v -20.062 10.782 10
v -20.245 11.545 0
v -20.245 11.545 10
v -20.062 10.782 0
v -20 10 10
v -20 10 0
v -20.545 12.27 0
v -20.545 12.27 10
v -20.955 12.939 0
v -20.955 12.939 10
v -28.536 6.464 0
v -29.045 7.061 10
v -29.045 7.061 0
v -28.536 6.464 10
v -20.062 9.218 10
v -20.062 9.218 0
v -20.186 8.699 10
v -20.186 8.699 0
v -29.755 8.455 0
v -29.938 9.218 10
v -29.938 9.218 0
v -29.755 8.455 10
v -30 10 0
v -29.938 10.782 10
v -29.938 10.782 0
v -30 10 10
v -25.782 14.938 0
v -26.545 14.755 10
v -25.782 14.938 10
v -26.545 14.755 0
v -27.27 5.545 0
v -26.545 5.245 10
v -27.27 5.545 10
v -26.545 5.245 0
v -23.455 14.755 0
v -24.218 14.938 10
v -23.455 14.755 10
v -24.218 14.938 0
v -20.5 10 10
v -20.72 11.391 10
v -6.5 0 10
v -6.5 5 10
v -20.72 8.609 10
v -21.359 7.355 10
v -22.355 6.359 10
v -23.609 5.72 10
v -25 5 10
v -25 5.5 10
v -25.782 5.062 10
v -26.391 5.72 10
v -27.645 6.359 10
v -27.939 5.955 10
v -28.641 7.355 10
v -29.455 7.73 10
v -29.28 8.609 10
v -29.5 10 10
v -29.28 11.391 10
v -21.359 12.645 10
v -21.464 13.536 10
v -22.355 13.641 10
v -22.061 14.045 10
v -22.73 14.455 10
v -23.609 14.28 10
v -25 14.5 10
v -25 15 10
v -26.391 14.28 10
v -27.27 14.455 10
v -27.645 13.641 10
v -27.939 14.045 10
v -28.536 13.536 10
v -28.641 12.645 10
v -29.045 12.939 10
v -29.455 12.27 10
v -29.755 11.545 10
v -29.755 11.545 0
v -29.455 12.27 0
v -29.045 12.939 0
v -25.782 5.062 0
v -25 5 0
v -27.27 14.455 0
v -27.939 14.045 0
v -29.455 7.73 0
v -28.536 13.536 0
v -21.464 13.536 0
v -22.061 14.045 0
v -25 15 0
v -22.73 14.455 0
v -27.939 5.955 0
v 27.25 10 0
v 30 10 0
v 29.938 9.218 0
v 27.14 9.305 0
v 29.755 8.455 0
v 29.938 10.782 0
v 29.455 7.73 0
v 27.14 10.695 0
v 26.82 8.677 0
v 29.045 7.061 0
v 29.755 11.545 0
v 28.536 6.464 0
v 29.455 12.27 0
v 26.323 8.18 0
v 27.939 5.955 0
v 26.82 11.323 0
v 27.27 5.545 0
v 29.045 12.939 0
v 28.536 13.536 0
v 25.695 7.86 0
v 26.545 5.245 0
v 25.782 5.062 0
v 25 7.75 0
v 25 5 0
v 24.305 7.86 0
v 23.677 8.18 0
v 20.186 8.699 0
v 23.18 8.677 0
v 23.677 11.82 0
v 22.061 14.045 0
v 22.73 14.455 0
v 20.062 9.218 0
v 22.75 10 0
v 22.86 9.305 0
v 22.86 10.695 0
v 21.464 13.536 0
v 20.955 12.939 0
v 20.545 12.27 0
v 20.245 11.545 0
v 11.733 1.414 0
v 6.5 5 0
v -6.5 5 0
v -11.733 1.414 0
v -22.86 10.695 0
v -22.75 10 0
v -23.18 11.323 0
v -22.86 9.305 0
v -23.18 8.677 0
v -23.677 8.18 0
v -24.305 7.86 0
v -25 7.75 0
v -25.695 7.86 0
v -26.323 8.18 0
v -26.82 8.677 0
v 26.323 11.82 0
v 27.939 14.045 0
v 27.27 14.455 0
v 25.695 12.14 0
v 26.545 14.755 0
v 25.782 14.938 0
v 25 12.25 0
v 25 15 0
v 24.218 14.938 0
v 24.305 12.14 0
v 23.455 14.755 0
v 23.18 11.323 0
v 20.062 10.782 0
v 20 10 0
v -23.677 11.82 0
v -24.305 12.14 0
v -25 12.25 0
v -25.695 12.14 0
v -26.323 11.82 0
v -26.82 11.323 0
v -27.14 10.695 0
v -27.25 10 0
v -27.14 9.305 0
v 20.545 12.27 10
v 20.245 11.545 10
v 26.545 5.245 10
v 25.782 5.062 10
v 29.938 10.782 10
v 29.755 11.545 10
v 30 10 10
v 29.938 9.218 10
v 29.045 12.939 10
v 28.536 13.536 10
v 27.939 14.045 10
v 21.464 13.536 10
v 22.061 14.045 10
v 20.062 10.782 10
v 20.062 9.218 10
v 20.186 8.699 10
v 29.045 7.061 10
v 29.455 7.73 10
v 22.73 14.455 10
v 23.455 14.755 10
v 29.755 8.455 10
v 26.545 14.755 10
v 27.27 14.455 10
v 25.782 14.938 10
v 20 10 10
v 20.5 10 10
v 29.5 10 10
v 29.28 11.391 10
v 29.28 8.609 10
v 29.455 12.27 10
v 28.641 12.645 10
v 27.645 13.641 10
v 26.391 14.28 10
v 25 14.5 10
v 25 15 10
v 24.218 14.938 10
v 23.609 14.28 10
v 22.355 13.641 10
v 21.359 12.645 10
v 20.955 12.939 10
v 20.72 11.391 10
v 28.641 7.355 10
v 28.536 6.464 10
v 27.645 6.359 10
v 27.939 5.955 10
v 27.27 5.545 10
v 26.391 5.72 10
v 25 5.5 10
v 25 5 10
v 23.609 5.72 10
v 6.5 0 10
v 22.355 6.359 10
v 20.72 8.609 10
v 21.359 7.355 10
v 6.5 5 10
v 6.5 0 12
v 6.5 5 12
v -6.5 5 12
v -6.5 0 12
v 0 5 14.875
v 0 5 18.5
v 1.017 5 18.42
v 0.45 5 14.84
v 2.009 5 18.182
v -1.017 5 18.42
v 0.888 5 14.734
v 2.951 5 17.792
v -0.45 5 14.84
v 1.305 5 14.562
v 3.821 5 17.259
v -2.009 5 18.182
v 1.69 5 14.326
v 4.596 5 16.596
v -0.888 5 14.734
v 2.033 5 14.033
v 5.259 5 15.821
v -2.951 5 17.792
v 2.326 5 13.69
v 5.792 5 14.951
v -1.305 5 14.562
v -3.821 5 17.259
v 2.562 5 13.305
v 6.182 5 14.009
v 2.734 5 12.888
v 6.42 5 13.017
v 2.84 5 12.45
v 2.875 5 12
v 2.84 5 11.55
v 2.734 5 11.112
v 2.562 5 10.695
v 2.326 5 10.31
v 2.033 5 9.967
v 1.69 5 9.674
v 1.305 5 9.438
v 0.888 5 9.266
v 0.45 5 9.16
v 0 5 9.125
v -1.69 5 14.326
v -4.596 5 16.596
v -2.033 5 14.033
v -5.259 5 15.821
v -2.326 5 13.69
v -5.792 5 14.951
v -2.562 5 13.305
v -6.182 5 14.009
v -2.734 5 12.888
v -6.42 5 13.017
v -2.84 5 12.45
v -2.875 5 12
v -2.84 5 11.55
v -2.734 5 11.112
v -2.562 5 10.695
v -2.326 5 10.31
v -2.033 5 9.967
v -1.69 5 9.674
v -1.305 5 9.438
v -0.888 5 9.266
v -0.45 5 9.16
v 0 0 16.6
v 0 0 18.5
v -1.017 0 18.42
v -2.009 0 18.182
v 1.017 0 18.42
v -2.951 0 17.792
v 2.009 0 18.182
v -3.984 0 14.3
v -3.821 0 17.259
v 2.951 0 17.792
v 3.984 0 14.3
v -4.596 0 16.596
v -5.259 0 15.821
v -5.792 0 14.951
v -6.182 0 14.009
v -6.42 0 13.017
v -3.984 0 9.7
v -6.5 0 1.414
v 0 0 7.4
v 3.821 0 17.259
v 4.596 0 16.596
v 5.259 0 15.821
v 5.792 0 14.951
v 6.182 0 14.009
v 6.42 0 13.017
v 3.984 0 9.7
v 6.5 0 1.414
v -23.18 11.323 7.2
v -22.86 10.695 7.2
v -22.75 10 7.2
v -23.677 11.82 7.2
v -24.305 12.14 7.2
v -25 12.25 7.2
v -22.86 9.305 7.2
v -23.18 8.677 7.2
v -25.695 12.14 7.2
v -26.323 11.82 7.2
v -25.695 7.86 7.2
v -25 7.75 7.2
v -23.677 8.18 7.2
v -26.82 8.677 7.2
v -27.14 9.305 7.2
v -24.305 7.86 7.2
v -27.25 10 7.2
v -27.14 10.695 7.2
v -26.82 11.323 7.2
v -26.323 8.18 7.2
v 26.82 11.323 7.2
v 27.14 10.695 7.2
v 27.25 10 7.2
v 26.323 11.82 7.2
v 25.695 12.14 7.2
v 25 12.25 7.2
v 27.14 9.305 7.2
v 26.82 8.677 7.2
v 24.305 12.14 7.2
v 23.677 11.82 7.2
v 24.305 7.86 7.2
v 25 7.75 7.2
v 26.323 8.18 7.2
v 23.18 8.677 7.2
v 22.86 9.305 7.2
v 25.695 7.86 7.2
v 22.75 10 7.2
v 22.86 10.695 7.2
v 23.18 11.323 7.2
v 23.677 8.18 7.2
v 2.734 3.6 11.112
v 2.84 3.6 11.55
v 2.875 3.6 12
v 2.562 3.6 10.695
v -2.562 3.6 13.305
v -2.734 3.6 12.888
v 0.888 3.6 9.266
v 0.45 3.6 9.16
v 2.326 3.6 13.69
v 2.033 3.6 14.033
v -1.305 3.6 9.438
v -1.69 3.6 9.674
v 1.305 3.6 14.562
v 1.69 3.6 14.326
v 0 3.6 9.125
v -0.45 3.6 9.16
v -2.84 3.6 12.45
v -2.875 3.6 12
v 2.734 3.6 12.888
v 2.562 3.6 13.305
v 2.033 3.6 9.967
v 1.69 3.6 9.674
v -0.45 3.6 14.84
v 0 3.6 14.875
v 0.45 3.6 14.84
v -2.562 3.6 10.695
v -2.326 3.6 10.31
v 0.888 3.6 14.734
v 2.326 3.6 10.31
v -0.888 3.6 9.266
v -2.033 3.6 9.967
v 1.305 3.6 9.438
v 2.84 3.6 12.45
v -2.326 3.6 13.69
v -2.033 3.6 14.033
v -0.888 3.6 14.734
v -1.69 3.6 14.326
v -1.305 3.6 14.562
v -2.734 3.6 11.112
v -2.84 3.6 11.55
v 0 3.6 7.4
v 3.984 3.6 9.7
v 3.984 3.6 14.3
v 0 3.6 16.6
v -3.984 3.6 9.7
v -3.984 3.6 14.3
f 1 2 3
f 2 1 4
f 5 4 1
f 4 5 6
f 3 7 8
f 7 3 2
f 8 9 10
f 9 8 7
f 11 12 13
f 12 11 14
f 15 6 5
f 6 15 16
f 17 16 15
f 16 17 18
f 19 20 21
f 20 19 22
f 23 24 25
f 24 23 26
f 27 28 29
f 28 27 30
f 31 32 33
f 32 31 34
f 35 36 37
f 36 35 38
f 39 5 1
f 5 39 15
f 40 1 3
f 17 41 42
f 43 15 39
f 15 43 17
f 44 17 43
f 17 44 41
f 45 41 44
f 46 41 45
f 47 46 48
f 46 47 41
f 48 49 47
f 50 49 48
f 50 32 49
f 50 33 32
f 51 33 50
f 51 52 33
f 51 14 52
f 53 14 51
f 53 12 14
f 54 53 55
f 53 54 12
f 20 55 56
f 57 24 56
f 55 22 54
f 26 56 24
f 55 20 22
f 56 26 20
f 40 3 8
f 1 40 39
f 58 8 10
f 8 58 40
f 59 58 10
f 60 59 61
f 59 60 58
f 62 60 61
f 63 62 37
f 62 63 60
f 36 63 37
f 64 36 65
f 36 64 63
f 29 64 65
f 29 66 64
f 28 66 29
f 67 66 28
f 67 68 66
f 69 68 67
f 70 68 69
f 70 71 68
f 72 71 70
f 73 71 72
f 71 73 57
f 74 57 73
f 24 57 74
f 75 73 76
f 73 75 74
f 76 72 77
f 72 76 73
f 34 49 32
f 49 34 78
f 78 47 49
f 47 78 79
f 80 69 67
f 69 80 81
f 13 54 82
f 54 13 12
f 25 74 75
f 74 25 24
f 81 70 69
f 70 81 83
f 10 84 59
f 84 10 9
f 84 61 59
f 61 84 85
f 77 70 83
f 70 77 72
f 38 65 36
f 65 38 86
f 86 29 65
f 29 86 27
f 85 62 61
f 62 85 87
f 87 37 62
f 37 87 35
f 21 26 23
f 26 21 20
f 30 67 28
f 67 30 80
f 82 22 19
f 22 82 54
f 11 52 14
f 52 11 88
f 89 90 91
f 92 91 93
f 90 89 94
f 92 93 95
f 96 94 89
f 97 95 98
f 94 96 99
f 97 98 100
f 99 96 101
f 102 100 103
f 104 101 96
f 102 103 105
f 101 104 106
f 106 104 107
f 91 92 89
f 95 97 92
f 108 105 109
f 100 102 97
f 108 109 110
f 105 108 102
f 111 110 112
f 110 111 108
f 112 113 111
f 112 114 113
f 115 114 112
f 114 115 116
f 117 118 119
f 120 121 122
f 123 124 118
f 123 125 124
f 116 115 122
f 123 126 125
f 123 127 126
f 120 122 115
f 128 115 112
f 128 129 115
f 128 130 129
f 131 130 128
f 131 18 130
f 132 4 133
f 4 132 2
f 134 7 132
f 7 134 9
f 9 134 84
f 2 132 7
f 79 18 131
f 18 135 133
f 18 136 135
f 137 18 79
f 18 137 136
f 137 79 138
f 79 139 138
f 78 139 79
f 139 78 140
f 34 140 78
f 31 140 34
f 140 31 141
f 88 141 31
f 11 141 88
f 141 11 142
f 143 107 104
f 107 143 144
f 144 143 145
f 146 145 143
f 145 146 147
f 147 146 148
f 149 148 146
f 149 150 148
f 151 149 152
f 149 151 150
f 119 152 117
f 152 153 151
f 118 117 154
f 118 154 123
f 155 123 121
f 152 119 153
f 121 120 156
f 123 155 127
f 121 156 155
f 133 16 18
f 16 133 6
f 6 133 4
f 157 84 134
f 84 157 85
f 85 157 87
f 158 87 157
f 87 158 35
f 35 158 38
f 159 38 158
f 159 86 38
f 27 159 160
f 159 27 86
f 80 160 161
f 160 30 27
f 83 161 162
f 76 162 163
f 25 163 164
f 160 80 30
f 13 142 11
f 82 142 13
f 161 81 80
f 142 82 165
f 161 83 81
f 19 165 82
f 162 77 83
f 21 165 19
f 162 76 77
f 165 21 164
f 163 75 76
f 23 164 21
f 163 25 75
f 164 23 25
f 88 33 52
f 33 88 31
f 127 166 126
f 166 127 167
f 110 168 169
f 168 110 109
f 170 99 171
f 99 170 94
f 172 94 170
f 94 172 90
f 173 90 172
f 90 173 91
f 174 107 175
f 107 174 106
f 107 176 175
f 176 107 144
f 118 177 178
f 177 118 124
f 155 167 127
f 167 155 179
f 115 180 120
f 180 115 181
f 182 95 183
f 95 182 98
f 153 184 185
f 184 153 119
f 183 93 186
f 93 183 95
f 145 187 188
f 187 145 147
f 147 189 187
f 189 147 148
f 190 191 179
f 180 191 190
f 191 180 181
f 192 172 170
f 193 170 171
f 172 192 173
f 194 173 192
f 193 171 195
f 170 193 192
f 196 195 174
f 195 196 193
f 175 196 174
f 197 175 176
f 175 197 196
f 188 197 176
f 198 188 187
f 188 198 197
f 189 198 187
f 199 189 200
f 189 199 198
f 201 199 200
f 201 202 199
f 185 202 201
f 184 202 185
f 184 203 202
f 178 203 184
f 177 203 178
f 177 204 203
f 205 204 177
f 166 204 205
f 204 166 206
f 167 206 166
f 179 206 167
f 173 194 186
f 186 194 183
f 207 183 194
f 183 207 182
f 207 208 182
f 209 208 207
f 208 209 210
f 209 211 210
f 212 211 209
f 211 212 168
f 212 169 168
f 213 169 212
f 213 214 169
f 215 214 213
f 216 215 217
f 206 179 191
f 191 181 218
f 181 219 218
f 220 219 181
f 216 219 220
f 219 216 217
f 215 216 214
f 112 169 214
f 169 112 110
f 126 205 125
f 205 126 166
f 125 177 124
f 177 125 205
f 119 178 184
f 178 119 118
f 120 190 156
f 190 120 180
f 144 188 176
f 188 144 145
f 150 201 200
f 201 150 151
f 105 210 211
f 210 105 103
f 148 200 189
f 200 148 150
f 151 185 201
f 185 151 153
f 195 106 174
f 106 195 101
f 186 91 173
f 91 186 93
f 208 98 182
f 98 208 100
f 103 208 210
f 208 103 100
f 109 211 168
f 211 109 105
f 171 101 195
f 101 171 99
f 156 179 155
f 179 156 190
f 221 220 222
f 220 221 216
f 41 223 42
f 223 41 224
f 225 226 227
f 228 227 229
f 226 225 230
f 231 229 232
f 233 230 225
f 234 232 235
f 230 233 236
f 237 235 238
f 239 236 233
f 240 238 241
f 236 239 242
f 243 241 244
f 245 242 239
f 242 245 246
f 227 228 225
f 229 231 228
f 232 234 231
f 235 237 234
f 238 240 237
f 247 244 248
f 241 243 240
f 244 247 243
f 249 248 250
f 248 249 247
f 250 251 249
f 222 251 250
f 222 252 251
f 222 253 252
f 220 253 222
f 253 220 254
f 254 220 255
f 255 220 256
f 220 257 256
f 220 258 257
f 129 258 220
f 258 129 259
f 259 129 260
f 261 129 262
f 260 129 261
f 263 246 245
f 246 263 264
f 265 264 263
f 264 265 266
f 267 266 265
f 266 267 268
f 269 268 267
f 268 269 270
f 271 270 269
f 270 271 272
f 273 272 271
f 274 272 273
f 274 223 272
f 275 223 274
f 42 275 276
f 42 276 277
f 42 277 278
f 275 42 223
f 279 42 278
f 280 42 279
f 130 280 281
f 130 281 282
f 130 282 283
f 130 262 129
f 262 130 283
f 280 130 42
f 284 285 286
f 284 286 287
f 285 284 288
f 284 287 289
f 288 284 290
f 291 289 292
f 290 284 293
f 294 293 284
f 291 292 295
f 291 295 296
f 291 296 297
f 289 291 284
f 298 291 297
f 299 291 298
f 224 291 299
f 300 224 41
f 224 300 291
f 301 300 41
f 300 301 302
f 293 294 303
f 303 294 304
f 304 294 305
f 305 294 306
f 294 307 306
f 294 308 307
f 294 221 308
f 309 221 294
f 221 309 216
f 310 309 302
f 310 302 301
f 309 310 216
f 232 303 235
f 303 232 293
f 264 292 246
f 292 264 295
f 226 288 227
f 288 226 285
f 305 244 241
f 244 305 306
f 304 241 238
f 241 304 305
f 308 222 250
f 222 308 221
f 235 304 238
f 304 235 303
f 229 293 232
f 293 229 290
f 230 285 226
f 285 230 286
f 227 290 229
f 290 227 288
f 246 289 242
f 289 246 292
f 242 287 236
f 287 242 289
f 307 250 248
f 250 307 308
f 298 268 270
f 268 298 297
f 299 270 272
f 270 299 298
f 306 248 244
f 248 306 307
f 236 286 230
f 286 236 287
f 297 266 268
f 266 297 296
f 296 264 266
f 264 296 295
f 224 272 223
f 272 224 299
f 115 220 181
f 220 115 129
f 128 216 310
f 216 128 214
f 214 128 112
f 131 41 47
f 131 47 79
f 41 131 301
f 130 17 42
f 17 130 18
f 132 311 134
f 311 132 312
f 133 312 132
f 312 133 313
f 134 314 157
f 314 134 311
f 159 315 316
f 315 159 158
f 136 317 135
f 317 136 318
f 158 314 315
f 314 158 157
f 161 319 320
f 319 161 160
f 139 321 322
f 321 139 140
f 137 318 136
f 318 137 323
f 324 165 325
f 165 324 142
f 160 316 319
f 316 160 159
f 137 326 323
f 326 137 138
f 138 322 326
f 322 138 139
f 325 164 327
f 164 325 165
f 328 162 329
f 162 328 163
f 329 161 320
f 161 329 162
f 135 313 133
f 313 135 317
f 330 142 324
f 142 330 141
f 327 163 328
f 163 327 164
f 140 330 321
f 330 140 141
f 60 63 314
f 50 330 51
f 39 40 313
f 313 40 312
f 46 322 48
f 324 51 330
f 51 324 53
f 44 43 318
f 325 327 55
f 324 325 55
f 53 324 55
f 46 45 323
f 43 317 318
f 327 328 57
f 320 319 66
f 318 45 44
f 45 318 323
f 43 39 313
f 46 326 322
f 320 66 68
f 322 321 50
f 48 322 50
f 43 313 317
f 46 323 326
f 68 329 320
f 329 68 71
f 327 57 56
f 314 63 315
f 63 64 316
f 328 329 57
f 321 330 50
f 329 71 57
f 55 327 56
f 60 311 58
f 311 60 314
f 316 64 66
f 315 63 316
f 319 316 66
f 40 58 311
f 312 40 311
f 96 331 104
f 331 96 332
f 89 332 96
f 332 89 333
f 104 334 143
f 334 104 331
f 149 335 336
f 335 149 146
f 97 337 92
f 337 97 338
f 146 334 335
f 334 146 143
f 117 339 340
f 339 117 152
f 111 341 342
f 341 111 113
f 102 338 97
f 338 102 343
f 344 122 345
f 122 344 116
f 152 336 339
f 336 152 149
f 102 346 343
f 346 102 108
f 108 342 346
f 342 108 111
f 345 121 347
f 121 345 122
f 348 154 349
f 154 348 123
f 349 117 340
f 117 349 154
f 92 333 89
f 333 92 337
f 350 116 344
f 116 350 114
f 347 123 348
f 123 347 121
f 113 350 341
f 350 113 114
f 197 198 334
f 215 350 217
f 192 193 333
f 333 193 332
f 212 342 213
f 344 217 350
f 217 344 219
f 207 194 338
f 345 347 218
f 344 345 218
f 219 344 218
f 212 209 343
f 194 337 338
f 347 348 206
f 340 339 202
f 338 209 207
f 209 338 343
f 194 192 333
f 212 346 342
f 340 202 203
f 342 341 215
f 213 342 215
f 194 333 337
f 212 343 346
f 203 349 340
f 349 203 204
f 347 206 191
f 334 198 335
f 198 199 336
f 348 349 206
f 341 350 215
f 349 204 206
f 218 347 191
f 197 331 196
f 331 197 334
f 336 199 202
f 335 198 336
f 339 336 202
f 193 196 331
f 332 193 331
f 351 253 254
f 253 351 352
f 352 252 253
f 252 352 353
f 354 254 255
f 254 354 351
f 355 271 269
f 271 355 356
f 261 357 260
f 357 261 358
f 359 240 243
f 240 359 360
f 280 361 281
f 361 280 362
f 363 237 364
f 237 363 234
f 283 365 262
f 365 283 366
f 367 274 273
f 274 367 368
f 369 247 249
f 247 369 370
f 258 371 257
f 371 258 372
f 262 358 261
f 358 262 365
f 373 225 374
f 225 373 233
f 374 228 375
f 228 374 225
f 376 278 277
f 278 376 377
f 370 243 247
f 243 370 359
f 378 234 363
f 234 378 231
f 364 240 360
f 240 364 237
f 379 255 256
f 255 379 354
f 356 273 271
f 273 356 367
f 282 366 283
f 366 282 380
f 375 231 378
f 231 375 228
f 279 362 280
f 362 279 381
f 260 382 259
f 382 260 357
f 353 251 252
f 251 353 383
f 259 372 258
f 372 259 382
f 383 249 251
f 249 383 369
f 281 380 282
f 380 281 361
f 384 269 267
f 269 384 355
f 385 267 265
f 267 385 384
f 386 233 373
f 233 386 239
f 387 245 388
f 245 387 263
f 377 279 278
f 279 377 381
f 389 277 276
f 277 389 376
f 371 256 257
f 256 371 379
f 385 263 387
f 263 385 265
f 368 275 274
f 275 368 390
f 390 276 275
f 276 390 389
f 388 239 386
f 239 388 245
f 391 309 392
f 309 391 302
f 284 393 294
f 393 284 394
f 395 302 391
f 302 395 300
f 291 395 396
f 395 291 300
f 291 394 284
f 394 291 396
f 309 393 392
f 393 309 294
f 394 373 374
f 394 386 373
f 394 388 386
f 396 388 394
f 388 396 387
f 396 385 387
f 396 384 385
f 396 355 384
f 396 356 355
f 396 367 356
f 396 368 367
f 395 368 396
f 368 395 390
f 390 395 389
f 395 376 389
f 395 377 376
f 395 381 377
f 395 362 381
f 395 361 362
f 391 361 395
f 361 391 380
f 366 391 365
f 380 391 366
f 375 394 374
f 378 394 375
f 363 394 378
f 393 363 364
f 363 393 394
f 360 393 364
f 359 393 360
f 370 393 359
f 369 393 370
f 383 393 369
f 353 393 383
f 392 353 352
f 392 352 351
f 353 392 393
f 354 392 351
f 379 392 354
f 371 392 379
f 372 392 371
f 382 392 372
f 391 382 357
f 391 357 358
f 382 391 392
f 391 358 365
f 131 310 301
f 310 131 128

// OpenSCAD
// file: util.scad
_screw_post_dia = 10;
_screw_post_height = 10;

module screwPost(hole)
{
	screw_slope_z = 2.8;
	screw_dia = 4.5;
	screw_head = 9;

	if (hole)
	{
		$fn = 20;
		cylinder(h=_screw_post_height+1, d=screw_dia);
		
		translate([0, 0, _screw_post_height - screw_slope_z])
		cylinder(h=screw_slope_z, d1=screw_dia, d2=screw_head);
	}
	else
	{
		cylinder(h=_screw_post_height, d=_screw_post_dia);
	}
}
// main file
hole_factor = 1.15;
screw_hole_pos = [25, 10];
bolt_dia = 5 * hole_factor;
nut_rad_min = 4 * hole_factor;
nut_rad_max = 4.5 * hole_factor;
nut_depth = 3.6;
nut_centre = 12;
post = [13, 5];
arm_width = 5;
$fn = 40;

nut_shape = [for (a = [0:60:300]) nut_rad_min * [sin(a), cos(a)]];

include <util.scad>

module arm()
{
	x1 = post.x / 2;
	x2 = screw_hole_pos.x;
	y = screw_hole_pos.y - _screw_post_dia / 2;
	poly = [[x1, 0], [x1, arm_width], [x2, y + arm_width], [x2, y]];
	linear_extrude(height=_screw_post_height) polygon(poly);
}

module screwPosts(hole)
{
	for (x = [-screw_hole_pos.x, screw_hole_pos.x])
		translate([x, screw_hole_pos.y, 0]) screwPost(hole);
}

difference()
{
	union()
	{
		translate([-post.x/ 2, 0, 0]) cube([post.x, post.y, nut_centre]);

		translate([0, 0, nut_centre]) 
		rotate([-90, 0, 0])
		cylinder(h=post.y, d=post.x);
		
		screwPosts(false);
		
		arm();
		mirror([1, 0, 0]) arm();
	}	

	screwPosts(true);
	
	translate([0, 0, nut_centre]) 
	rotate([-90, 0, 0])
	{
		cylinder(h=post.y+2, d=bolt_dia);
		linear_extrude(height=nut_depth) polygon(nut_shape);
	}
	
	rotate([45, 0, 0])
	cube([40, 2, 2], center=true);
	//translate([])
	
}
